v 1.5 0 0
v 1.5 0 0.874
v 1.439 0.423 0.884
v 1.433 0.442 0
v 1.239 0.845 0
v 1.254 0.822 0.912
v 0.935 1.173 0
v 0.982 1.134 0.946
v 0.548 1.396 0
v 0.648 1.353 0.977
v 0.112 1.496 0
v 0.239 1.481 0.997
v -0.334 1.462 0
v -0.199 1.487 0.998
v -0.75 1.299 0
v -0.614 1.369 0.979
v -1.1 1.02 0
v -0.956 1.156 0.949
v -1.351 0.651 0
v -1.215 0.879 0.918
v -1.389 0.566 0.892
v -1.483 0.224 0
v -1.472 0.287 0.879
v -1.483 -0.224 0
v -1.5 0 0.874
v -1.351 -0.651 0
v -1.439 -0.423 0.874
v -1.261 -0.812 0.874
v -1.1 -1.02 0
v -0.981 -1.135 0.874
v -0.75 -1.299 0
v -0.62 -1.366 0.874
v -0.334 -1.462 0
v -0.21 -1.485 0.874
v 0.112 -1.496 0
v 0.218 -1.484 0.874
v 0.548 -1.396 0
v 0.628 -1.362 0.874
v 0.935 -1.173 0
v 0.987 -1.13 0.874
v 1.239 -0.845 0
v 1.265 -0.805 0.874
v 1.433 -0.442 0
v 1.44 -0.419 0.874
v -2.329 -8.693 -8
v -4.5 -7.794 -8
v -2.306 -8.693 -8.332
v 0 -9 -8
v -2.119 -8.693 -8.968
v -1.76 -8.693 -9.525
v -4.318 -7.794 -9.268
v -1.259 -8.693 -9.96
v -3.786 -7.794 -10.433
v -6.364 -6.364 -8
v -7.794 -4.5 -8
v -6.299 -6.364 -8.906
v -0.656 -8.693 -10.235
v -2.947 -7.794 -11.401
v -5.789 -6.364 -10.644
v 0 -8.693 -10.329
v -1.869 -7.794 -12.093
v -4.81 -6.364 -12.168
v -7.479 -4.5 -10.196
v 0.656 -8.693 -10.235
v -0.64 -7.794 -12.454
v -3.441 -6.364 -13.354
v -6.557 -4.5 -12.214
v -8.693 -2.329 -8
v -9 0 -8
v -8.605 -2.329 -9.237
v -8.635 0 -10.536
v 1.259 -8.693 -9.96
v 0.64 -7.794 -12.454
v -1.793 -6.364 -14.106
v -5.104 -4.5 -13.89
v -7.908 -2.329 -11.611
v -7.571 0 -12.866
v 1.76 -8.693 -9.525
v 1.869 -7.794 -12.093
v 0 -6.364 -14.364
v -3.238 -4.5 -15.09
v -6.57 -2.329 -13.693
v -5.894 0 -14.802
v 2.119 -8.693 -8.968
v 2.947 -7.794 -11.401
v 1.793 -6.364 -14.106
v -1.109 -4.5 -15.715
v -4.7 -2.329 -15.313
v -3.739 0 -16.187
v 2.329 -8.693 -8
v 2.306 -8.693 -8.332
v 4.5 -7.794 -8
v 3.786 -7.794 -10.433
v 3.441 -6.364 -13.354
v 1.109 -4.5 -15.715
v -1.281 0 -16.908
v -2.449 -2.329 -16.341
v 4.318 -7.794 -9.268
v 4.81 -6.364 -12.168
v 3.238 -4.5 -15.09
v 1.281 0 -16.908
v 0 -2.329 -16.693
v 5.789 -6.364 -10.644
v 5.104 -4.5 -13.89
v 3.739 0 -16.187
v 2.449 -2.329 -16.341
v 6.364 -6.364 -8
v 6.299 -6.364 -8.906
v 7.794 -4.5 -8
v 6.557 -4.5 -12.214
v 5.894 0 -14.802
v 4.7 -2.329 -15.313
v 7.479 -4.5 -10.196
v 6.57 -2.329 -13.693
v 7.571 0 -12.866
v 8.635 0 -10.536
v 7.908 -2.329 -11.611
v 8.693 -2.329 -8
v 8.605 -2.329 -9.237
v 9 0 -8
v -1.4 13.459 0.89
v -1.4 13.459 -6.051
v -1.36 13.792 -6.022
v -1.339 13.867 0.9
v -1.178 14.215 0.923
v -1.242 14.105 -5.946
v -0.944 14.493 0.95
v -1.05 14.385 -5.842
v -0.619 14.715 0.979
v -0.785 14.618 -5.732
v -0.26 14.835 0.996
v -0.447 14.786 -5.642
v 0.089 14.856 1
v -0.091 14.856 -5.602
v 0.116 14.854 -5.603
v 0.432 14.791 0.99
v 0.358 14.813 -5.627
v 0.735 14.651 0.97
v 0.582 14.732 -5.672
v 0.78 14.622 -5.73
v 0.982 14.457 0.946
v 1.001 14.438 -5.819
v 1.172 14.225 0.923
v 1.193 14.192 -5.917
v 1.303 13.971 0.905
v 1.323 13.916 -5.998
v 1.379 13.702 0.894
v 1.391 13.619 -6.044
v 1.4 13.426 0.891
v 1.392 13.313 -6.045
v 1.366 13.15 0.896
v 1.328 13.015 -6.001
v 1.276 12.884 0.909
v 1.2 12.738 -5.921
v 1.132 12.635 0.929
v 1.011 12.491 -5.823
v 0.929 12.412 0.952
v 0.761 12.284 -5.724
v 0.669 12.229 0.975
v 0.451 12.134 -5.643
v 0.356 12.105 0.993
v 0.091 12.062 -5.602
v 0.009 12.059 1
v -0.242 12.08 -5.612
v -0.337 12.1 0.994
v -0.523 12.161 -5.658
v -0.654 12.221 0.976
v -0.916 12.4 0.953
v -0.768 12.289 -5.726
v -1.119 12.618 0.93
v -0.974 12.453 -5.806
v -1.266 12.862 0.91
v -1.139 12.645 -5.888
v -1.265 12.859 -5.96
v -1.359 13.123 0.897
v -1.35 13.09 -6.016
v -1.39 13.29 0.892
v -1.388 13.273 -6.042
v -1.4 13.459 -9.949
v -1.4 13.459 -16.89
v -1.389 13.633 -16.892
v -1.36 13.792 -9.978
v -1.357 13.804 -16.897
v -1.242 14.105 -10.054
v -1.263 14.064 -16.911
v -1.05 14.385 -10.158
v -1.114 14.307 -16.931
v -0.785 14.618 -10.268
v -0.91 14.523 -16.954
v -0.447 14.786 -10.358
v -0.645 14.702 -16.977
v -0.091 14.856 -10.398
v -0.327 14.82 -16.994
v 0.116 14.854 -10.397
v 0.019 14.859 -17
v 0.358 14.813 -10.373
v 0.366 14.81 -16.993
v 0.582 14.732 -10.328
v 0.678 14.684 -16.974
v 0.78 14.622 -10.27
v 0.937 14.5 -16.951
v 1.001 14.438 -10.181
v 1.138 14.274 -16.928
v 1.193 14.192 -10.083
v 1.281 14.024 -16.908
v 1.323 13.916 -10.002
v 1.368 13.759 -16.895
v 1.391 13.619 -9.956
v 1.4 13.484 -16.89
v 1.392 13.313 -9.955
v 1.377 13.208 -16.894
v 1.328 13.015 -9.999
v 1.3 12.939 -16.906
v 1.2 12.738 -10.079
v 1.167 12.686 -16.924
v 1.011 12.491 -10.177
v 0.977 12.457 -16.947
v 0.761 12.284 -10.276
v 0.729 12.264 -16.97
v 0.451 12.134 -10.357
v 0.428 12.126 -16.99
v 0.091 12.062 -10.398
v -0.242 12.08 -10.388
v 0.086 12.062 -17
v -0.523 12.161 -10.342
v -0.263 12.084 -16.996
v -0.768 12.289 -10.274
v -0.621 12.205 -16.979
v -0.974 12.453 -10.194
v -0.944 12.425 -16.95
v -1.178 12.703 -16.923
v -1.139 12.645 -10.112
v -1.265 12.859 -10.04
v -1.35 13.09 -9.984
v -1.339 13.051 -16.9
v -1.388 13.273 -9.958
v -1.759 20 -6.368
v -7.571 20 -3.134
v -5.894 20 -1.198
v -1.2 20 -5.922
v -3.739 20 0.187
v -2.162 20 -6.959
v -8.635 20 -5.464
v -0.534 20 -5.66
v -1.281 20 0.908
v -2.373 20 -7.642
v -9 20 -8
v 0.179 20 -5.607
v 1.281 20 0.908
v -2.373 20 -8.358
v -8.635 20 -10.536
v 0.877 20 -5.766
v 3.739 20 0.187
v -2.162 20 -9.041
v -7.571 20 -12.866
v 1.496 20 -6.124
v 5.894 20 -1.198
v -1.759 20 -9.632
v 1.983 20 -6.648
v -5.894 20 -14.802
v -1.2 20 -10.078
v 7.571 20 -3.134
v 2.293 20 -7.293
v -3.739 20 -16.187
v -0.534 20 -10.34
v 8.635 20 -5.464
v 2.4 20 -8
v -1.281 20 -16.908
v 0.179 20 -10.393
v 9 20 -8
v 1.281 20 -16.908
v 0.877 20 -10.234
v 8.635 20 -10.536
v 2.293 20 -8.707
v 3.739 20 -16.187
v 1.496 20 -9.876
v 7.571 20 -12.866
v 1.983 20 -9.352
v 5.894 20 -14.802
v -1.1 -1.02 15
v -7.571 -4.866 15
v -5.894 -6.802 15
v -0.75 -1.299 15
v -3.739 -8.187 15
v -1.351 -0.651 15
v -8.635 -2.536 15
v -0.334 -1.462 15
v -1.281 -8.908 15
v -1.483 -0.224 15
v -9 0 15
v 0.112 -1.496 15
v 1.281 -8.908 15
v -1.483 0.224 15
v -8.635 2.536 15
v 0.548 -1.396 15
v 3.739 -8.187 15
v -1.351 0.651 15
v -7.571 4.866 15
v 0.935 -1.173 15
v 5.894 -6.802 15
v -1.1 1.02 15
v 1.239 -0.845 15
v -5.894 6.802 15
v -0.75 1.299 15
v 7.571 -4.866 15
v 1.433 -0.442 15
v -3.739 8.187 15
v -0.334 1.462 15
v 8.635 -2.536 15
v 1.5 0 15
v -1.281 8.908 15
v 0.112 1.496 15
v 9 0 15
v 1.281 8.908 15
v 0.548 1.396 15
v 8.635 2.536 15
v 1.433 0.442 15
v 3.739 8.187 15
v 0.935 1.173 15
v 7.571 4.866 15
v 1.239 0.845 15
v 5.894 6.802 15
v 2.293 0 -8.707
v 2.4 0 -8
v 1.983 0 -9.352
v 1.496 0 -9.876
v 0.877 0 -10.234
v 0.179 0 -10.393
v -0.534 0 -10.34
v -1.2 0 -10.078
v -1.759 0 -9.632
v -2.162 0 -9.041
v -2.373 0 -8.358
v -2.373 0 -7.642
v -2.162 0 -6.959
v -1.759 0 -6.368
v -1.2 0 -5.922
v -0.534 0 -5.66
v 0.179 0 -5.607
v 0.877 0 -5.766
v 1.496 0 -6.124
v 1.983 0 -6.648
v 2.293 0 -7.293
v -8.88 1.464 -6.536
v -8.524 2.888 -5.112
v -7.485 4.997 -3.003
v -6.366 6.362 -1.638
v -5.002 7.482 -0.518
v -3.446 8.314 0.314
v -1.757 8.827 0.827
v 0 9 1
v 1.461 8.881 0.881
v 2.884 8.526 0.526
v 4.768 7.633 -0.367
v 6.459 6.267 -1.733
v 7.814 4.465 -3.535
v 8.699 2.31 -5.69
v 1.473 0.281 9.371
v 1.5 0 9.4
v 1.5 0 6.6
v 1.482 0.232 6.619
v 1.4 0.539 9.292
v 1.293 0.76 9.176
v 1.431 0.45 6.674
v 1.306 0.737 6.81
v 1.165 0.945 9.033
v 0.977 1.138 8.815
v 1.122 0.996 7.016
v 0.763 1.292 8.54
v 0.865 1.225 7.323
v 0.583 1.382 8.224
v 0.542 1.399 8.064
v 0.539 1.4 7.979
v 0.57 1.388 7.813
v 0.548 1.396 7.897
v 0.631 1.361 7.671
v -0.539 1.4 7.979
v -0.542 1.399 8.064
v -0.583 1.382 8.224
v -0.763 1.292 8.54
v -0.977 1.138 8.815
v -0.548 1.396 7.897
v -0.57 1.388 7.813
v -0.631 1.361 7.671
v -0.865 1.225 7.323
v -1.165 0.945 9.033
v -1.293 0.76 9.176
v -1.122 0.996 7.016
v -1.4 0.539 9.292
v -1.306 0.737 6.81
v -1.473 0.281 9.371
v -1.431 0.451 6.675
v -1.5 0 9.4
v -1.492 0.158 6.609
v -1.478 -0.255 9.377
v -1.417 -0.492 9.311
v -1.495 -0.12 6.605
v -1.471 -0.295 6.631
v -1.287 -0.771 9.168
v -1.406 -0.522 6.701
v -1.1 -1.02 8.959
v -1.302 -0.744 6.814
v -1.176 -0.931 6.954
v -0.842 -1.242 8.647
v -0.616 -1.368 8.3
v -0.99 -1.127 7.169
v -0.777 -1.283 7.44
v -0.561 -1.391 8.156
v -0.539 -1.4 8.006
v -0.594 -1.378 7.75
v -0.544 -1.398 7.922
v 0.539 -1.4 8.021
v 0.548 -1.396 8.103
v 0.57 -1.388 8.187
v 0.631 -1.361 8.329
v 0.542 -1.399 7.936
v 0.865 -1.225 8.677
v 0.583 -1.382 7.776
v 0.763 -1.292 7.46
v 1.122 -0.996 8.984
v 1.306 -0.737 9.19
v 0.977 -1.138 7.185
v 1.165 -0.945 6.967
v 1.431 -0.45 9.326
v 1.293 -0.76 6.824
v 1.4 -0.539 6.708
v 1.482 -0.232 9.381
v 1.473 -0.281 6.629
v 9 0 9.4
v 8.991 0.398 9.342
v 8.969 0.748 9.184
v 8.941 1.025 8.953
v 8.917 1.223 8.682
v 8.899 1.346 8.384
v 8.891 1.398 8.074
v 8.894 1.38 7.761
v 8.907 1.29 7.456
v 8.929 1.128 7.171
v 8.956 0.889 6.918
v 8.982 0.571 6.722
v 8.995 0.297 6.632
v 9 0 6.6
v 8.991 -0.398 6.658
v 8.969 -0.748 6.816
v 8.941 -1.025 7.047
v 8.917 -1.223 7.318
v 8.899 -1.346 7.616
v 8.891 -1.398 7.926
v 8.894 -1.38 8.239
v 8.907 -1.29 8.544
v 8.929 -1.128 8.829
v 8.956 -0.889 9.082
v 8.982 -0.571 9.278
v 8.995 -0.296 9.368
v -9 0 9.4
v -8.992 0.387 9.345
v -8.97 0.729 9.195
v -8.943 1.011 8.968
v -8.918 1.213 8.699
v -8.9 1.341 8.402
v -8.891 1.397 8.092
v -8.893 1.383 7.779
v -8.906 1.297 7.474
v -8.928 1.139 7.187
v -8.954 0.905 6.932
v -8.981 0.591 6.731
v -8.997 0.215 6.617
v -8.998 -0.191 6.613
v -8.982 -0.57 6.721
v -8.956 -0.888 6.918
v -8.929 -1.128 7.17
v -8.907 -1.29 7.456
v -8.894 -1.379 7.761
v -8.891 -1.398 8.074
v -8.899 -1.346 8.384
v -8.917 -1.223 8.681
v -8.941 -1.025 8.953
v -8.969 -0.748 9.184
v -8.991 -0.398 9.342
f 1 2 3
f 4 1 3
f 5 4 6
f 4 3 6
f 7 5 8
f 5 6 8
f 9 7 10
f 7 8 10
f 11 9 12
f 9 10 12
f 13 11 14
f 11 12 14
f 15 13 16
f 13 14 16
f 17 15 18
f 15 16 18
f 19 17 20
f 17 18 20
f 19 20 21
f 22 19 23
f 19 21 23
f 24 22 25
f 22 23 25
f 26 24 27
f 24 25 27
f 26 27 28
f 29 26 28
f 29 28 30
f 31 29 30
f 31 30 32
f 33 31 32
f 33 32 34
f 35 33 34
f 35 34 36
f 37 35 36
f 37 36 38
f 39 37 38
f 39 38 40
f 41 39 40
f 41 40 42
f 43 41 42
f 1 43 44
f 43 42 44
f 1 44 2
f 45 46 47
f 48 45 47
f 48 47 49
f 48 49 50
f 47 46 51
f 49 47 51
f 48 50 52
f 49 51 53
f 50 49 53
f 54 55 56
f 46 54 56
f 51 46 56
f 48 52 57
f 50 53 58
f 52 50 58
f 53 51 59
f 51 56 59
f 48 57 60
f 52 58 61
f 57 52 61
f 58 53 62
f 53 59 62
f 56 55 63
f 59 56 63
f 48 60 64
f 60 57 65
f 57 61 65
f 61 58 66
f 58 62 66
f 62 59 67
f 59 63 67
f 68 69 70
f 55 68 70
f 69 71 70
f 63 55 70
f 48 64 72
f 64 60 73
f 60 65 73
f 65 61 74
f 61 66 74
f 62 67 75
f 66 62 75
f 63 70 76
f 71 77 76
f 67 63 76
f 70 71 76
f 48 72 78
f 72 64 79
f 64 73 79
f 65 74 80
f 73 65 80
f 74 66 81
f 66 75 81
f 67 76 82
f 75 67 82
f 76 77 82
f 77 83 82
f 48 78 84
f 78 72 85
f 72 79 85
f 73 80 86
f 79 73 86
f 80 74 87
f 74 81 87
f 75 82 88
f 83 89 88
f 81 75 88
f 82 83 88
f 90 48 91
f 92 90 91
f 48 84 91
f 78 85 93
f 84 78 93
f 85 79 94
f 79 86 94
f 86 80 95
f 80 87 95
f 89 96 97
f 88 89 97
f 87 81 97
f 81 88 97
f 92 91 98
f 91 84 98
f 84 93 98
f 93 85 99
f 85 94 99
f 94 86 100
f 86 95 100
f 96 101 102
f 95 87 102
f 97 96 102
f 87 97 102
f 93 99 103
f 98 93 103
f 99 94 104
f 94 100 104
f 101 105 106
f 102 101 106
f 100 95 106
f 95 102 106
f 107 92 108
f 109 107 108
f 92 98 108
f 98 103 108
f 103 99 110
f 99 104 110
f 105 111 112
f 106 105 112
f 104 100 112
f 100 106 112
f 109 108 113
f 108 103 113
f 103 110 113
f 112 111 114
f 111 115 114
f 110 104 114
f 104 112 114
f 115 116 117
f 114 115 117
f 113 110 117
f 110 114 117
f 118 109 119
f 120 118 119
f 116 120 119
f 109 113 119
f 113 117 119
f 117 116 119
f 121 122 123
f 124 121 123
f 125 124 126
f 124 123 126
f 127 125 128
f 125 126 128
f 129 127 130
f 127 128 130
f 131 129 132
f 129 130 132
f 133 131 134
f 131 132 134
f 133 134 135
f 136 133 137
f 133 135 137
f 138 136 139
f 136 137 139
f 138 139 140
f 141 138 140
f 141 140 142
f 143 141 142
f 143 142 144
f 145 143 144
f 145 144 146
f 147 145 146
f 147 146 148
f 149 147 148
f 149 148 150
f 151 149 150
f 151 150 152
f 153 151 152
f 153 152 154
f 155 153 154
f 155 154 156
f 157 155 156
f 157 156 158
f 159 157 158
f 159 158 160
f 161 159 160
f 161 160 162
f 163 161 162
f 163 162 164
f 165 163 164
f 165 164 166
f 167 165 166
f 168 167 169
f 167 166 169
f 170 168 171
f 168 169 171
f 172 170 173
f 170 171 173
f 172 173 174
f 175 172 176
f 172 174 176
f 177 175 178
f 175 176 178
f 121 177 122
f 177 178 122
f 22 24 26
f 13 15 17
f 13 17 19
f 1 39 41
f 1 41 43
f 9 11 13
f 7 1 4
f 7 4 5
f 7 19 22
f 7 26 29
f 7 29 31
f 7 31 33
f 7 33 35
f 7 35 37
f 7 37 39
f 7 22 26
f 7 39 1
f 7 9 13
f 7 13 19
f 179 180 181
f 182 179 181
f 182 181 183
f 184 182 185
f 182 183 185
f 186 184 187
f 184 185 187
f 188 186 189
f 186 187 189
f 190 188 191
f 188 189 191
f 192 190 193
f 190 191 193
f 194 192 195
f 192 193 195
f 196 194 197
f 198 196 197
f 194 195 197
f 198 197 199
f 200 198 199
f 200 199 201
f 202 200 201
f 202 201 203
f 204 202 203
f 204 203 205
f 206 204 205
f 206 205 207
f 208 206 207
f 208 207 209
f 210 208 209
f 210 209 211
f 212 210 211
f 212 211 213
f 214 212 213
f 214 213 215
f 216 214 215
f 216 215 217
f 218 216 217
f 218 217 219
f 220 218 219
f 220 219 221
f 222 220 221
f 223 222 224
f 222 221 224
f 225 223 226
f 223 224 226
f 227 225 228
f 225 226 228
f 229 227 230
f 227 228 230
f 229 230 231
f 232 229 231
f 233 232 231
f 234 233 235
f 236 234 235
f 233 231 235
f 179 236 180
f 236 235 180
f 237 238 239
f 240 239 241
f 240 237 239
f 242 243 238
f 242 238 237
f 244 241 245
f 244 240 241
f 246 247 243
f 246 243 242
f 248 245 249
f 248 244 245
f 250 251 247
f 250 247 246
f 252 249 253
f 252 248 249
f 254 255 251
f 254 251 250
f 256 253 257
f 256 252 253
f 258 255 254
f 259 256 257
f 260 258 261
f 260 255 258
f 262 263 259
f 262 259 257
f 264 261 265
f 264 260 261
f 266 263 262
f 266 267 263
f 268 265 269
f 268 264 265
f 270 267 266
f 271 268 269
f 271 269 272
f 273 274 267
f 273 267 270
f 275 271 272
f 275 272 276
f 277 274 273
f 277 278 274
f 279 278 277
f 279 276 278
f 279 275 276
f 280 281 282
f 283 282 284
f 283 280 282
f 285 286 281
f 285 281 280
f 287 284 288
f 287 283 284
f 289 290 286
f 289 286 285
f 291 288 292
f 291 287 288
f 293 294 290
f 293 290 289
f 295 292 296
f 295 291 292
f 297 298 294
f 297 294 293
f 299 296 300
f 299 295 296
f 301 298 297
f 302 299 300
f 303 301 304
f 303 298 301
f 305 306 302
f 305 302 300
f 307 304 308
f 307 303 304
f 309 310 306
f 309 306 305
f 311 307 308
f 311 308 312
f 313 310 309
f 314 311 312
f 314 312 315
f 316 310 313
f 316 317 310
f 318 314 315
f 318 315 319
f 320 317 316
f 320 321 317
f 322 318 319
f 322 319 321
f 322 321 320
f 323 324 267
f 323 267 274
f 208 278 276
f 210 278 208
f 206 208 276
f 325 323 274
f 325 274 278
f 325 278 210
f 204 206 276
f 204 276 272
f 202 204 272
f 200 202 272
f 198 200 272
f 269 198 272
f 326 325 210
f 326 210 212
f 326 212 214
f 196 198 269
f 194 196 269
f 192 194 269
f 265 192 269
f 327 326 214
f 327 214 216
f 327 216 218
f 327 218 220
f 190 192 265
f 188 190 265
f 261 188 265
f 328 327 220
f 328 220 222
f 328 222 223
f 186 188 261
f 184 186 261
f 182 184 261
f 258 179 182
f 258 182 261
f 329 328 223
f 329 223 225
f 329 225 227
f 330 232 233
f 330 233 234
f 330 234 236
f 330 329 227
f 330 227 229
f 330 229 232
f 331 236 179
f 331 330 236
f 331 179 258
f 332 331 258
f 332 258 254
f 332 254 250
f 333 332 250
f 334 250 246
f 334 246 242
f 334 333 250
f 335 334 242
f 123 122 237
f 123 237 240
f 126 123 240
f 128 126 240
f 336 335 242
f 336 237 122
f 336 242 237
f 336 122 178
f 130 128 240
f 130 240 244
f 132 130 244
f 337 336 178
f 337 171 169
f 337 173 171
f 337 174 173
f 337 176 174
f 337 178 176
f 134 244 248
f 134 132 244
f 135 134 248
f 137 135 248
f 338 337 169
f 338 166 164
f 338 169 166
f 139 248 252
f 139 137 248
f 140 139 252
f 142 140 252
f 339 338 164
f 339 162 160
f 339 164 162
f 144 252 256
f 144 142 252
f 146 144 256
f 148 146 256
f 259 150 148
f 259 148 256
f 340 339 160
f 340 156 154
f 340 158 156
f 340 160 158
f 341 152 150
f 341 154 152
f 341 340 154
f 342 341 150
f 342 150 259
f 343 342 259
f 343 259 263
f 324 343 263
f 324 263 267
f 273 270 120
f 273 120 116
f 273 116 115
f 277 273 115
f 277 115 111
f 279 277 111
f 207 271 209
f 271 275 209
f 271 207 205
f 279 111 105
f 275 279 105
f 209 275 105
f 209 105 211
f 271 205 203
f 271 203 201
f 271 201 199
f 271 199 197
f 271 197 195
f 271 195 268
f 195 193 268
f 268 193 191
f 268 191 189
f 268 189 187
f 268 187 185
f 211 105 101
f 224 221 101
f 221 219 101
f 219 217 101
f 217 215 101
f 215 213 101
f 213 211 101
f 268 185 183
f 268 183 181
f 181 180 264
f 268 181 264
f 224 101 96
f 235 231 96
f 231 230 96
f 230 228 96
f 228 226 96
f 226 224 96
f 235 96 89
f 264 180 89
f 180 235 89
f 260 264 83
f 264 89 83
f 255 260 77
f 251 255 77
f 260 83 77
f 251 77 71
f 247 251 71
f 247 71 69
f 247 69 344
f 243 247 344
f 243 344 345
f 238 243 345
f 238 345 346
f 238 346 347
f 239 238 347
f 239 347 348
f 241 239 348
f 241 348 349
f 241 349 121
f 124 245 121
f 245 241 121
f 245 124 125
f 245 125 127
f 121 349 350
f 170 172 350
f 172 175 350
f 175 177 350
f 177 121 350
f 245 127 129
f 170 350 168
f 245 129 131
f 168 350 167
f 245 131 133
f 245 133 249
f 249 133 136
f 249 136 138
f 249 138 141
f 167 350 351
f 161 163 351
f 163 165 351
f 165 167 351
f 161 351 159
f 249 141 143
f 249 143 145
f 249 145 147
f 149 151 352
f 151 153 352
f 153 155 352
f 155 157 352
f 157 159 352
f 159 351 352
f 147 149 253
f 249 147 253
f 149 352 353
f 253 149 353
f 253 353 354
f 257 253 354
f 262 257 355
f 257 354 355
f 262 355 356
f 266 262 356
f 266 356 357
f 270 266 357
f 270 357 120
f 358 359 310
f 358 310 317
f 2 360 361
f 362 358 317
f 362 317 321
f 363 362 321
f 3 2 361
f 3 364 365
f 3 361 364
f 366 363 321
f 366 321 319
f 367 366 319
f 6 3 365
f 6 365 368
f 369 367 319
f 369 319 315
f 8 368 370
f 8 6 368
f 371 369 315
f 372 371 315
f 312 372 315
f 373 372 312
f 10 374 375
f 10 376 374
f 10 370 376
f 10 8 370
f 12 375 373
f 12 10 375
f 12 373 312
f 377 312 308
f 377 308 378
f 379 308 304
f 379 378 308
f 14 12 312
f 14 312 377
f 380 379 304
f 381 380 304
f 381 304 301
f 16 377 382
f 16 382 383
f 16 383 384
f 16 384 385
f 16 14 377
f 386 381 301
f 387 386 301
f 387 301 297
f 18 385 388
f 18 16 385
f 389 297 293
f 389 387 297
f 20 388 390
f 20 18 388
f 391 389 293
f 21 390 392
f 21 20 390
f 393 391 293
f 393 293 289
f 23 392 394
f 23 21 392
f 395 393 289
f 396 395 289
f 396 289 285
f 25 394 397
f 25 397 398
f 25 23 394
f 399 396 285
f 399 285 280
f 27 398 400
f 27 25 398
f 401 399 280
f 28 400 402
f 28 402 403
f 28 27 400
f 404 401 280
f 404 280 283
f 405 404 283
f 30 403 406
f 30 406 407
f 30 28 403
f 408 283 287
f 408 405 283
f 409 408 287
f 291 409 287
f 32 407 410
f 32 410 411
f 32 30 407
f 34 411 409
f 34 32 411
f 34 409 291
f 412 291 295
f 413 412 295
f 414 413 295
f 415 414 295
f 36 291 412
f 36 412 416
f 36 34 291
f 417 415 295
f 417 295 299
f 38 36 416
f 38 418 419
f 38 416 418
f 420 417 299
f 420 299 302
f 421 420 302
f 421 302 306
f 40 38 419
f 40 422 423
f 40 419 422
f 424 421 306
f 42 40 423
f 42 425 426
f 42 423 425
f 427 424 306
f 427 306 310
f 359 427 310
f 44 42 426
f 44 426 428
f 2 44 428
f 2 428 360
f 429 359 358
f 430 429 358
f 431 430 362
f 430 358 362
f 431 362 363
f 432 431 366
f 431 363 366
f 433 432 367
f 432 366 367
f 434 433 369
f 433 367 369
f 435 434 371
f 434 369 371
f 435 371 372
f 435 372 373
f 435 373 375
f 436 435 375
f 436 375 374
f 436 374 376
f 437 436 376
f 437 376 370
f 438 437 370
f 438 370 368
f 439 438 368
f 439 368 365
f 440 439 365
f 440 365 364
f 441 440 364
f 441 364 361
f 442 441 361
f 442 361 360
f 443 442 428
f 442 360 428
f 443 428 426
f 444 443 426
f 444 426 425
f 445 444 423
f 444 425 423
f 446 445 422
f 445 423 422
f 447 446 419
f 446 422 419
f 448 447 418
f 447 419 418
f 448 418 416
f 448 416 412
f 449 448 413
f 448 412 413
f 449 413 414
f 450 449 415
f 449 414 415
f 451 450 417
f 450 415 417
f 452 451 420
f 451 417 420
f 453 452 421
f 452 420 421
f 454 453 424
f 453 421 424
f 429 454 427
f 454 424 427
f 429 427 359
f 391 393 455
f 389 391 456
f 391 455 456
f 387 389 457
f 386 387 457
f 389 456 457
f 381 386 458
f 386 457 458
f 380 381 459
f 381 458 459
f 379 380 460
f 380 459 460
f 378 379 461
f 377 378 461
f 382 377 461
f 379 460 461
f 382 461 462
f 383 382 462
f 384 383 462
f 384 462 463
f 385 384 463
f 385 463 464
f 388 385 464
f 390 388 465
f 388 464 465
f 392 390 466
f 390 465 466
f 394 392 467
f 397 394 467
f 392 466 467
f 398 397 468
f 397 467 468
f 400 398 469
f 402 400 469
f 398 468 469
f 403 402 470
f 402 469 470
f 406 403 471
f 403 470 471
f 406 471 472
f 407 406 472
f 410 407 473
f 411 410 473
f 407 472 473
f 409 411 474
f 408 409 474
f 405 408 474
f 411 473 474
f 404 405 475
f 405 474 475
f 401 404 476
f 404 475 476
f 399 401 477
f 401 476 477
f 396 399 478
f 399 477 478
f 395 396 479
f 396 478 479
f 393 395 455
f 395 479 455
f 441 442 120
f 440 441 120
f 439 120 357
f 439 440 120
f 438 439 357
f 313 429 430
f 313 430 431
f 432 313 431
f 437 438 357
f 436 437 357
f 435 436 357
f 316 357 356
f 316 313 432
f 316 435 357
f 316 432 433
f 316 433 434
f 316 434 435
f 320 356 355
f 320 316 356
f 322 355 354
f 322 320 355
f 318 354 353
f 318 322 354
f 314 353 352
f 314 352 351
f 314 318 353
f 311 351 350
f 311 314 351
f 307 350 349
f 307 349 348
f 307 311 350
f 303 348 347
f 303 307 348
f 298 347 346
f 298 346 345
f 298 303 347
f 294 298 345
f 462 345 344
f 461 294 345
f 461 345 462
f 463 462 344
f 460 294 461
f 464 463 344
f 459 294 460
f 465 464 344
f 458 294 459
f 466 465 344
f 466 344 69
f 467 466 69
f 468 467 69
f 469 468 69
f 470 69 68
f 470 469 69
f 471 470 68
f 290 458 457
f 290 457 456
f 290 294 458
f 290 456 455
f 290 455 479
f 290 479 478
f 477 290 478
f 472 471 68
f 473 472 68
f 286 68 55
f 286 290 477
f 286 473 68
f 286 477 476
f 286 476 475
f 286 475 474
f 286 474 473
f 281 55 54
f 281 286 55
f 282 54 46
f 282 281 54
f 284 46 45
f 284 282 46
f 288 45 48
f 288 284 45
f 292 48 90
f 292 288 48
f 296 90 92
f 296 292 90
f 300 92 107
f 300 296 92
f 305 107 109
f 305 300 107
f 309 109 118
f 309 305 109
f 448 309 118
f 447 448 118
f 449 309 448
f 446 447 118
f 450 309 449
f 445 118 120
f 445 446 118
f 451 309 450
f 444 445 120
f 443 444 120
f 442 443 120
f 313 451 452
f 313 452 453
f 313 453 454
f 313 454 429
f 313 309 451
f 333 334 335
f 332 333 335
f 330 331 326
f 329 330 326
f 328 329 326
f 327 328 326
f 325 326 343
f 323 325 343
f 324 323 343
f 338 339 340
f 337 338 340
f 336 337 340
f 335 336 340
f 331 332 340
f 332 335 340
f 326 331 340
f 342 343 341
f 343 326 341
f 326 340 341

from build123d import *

# Parameters (mm, degrees)
CROQUIS1_R                   = 9
CROQUIS1_R_2                 = 1.5
SALIENTE_EXTRUIR1_DEPTH      = 15
SALIENTE_EXTRUIR1_DEPTH_BACK = 8
CROQUIS2_R                   = 9
CROQUIS2_R_2                 = 2.4
SALIENTE_EXTRUIR4_DEPTH      = 20
CROQUIS7_R                   = 2.4
CORTAR_EXTRUIR1_DEPTH        = 20
CROQUIS8_R                   = 1.5
CORTAR_EXTRUIR2_DEPTH        = 15
CROQUIS9_R                   = 1.4
CORTAR_EXTRUIR3_DEPTH        = 19
CROQUIS10_R                  = 1.4
CORTAR_EXTRUIR4_DEPTH        = 1
CORTAR_EXTRUIR4_DEPTH_BACK   = 33.0000001


with BuildPart() as part:
    # Croquis1 → Saliente-Extruir1 (new body, two sides)
    with BuildSketch(Plane.XY) as saliente_extruir1_sk:
        Circle(CROQUIS1_R)
        Circle(CROQUIS1_R_2, mode=Mode.SUBTRACT)
    extrude(amount=SALIENTE_EXTRUIR1_DEPTH)
    extrude(saliente_extruir1_sk.sketch, amount=-SALIENTE_EXTRUIR1_DEPTH_BACK)

    # Croquis2 → Saliente-Extruir4 (add)
    with BuildSketch(Plane(origin=(0, 0, 0), x_dir=(1, 0, 0), z_dir=(0, 1, 0))):
        with Locations((0, 8)):
            Circle(CROQUIS2_R)
        with Locations((0, 8)):
            Circle(CROQUIS2_R_2, mode=Mode.SUBTRACT)
    extrude(amount=SALIENTE_EXTRUIR4_DEPTH)

    # Croquis6 → Revolución4 (revolve)
    with BuildSketch(Plane(origin=(0, 0, -8), x_dir=(-1, 0, 0), z_dir=(0, 0, -1))):
        with BuildLine():
            Line((0, 0), (0, -9))
            ThreePointArc((0, -9), (-6.363961031, -6.363961031), (-9, 0))
            Line((-9, 0), (0, 0))
        make_face()
    revolve(axis=Axis((0, 0, -8), (0, -1, 0)))

    # Croquis7 → Cortar-Extruir1 (cut)
    with BuildSketch(Plane(origin=(0, 20, 0), x_dir=(1, 0, 0), z_dir=(0, 1, 0))):
        with Locations((0, 8)):
            Circle(CROQUIS7_R)
    extrude(amount=-CORTAR_EXTRUIR1_DEPTH, mode=Mode.SUBTRACT)

    # Croquis8 → Cortar-Extruir2 (cut)
    with BuildSketch(Plane.XY.offset(15)):
        Circle(CROQUIS8_R)
    extrude(amount=-CORTAR_EXTRUIR2_DEPTH, mode=Mode.SUBTRACT)

    # Croquis9 → Cortar-Extruir3 (cut, through all)
    with BuildSketch(Plane.ZY.offset(9)):
        with Locations((8, 0)):
            Circle(CROQUIS9_R)
    extrude(amount=-CORTAR_EXTRUIR3_DEPTH, mode=Mode.SUBTRACT)

    # Croquis10 → Cortar-Extruir4 (cut, two sides)
    with BuildSketch(Plane(origin=(0, 0, -17), x_dir=(-1, 0, 0), z_dir=(0, 0, -1))) as cortar_extruir4_sk:
        with Locations((0, 13.459047629)):
            Circle(CROQUIS10_R)
    extrude(amount=CORTAR_EXTRUIR4_DEPTH, mode=Mode.SUBTRACT)
    extrude(cortar_extruir4_sk.sketch, amount=-CORTAR_EXTRUIR4_DEPTH_BACK, mode=Mode.SUBTRACT)


solid = part.part
